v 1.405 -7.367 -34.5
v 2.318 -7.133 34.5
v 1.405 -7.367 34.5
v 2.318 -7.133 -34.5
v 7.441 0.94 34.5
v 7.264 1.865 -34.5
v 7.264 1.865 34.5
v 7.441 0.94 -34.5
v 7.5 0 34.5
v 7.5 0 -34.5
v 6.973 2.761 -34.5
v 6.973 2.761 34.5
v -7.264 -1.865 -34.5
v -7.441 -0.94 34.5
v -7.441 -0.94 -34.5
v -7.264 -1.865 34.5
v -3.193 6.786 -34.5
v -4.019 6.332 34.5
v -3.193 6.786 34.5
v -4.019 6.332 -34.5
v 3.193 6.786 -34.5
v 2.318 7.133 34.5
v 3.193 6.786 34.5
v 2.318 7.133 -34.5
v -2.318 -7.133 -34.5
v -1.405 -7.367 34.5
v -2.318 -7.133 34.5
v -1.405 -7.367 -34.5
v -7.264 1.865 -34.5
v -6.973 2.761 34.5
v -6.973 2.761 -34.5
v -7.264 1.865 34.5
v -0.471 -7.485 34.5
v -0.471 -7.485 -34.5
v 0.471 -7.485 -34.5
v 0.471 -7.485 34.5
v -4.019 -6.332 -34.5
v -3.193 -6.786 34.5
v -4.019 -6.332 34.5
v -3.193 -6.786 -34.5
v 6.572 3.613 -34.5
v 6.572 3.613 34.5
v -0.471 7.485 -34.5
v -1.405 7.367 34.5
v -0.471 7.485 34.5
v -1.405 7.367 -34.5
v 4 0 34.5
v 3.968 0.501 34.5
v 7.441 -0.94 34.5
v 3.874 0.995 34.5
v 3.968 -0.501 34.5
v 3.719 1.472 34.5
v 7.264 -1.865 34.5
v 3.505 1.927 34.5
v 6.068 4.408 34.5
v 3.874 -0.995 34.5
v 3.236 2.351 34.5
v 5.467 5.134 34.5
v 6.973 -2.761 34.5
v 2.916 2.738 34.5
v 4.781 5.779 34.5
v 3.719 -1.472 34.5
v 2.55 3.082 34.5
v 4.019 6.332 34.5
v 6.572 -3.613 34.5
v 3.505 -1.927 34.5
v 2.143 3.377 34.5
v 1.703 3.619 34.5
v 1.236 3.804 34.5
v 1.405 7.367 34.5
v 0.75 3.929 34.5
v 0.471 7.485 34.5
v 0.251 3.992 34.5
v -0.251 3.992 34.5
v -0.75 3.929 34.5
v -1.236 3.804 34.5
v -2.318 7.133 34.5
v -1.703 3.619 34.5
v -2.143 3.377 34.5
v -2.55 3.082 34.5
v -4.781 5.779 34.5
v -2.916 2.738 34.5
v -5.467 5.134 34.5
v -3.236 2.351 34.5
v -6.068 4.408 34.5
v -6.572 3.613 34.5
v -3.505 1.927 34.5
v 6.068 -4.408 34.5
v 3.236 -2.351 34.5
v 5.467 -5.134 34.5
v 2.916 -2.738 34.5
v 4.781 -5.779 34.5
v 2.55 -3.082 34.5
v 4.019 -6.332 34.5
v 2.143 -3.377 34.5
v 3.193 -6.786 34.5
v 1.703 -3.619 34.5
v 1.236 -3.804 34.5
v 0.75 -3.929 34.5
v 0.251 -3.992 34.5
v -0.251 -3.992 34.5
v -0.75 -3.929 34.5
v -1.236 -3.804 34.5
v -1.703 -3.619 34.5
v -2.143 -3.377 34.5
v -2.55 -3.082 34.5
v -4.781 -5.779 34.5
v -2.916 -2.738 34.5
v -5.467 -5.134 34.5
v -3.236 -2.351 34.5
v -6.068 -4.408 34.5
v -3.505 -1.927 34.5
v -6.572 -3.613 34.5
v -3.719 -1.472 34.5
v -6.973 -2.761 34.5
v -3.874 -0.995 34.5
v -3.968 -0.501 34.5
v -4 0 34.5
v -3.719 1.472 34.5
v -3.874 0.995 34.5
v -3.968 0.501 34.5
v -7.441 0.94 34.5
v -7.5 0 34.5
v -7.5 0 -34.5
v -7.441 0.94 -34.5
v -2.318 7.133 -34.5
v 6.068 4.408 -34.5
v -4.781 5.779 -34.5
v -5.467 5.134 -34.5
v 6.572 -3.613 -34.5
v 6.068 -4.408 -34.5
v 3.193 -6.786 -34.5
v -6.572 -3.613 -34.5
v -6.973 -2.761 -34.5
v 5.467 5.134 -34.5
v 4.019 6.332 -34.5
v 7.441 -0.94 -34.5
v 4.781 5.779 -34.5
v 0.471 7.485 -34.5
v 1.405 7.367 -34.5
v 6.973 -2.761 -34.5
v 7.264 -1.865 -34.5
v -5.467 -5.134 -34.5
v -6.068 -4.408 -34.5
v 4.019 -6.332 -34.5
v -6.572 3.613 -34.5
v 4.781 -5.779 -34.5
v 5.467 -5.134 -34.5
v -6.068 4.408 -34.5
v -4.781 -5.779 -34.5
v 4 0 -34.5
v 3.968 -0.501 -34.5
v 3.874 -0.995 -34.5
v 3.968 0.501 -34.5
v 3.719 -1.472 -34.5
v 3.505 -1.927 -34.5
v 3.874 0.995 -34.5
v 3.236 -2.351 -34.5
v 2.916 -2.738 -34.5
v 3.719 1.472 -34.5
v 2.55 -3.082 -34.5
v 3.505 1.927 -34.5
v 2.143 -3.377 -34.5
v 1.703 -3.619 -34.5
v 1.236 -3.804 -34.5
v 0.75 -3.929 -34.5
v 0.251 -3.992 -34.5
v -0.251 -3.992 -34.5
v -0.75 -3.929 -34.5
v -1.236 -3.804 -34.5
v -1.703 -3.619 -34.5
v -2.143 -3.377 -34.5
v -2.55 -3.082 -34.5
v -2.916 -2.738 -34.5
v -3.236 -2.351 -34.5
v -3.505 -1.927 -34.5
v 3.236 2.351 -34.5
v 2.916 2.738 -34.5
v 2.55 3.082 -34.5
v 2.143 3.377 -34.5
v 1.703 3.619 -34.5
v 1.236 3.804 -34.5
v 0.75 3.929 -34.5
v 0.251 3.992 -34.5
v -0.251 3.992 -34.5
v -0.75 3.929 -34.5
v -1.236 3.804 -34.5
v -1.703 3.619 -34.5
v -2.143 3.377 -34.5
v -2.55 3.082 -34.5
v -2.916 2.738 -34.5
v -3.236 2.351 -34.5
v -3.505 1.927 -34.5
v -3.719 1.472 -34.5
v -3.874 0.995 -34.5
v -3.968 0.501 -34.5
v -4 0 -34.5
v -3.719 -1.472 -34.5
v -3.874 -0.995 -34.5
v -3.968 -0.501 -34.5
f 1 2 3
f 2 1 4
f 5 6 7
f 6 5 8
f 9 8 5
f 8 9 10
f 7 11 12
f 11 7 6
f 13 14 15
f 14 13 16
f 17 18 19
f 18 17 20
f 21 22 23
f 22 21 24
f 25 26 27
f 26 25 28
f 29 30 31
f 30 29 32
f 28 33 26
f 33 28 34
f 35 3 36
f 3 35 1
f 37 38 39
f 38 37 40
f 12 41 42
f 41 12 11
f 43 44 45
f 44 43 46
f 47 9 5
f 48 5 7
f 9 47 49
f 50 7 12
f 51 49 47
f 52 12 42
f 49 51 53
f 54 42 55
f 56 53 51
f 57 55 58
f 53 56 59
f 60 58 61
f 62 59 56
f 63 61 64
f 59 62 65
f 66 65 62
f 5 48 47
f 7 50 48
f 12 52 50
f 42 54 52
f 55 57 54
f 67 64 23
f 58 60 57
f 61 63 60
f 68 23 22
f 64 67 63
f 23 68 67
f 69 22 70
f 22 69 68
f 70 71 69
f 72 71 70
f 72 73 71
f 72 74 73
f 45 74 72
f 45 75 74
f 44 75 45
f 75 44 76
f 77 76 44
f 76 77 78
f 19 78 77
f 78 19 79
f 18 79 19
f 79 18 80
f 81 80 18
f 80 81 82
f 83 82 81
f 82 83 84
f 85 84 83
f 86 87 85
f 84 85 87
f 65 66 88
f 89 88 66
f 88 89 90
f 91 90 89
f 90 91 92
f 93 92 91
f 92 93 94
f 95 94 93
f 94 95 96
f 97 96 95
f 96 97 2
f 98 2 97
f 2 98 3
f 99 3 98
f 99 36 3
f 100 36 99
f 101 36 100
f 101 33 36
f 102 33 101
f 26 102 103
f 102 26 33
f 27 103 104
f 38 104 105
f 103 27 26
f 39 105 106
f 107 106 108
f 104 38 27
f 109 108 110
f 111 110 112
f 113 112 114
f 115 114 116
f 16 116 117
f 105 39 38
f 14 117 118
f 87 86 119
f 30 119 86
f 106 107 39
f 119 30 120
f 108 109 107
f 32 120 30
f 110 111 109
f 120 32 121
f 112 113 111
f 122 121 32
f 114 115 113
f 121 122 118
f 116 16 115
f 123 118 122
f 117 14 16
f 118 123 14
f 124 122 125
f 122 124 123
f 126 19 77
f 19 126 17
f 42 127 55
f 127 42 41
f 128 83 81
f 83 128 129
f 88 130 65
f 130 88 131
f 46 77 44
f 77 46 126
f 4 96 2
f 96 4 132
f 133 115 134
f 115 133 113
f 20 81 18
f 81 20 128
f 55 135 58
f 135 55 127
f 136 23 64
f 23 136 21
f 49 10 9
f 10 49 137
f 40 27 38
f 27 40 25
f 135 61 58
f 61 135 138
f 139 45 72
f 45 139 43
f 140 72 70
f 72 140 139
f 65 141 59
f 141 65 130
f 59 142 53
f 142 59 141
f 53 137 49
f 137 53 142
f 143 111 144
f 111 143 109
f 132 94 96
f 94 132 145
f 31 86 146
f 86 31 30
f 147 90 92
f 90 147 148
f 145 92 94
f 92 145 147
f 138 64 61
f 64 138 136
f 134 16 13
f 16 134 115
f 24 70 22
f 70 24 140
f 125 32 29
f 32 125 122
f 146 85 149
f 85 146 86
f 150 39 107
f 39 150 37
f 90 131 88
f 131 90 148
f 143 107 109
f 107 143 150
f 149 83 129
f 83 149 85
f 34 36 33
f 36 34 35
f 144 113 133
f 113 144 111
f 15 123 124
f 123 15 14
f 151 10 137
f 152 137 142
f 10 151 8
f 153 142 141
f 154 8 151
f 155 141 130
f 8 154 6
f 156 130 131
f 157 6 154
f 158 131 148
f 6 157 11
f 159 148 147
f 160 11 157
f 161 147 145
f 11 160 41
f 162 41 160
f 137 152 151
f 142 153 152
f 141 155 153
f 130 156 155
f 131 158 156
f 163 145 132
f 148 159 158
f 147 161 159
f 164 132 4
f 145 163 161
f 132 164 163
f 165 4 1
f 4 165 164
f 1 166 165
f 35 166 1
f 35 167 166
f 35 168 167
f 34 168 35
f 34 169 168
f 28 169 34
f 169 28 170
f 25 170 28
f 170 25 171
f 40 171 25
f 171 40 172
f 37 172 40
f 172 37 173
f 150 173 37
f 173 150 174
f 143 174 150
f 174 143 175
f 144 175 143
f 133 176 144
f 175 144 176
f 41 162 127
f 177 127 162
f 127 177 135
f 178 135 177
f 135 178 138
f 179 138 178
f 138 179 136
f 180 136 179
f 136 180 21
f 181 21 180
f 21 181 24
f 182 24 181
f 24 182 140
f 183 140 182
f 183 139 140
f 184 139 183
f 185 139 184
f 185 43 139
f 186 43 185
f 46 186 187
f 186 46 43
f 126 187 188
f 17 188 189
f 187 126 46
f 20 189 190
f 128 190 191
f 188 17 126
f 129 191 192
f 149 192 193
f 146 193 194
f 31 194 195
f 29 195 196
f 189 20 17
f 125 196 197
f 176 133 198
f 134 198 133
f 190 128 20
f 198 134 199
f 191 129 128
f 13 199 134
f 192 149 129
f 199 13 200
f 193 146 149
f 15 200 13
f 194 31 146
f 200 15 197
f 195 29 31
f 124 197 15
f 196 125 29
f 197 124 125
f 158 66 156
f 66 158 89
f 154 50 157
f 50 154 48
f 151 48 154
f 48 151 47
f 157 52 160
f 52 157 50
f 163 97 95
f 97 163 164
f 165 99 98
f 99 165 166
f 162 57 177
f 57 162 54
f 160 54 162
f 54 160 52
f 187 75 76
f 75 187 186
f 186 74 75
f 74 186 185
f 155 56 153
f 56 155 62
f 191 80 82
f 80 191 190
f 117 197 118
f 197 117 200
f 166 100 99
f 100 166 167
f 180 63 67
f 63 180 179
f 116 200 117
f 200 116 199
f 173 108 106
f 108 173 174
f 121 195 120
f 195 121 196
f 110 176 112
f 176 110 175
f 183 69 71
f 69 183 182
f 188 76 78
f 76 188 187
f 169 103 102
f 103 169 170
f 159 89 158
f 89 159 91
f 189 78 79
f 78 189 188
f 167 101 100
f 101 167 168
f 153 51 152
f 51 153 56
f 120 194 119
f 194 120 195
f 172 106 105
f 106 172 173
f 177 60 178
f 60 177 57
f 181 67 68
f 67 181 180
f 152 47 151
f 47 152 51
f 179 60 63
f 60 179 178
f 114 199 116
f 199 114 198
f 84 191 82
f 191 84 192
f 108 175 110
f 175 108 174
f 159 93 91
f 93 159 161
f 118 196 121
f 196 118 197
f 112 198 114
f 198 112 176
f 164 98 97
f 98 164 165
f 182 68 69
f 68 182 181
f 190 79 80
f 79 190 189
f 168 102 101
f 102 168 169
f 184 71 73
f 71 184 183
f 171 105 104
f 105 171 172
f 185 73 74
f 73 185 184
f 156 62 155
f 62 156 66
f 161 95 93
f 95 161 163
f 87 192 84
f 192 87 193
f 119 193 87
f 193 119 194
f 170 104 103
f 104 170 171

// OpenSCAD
$fn = 50;


difference() {
	union() {
		translate(v = [0, 0, -34.5000000000]) {
			cylinder(h = 69, r = 7.5000000000);
		}
	}
	union() {
		translate(v = [0, 0, -100.0000000000]) {
			cylinder(h = 200, r = 4.0000000000);
		}
	}
}
